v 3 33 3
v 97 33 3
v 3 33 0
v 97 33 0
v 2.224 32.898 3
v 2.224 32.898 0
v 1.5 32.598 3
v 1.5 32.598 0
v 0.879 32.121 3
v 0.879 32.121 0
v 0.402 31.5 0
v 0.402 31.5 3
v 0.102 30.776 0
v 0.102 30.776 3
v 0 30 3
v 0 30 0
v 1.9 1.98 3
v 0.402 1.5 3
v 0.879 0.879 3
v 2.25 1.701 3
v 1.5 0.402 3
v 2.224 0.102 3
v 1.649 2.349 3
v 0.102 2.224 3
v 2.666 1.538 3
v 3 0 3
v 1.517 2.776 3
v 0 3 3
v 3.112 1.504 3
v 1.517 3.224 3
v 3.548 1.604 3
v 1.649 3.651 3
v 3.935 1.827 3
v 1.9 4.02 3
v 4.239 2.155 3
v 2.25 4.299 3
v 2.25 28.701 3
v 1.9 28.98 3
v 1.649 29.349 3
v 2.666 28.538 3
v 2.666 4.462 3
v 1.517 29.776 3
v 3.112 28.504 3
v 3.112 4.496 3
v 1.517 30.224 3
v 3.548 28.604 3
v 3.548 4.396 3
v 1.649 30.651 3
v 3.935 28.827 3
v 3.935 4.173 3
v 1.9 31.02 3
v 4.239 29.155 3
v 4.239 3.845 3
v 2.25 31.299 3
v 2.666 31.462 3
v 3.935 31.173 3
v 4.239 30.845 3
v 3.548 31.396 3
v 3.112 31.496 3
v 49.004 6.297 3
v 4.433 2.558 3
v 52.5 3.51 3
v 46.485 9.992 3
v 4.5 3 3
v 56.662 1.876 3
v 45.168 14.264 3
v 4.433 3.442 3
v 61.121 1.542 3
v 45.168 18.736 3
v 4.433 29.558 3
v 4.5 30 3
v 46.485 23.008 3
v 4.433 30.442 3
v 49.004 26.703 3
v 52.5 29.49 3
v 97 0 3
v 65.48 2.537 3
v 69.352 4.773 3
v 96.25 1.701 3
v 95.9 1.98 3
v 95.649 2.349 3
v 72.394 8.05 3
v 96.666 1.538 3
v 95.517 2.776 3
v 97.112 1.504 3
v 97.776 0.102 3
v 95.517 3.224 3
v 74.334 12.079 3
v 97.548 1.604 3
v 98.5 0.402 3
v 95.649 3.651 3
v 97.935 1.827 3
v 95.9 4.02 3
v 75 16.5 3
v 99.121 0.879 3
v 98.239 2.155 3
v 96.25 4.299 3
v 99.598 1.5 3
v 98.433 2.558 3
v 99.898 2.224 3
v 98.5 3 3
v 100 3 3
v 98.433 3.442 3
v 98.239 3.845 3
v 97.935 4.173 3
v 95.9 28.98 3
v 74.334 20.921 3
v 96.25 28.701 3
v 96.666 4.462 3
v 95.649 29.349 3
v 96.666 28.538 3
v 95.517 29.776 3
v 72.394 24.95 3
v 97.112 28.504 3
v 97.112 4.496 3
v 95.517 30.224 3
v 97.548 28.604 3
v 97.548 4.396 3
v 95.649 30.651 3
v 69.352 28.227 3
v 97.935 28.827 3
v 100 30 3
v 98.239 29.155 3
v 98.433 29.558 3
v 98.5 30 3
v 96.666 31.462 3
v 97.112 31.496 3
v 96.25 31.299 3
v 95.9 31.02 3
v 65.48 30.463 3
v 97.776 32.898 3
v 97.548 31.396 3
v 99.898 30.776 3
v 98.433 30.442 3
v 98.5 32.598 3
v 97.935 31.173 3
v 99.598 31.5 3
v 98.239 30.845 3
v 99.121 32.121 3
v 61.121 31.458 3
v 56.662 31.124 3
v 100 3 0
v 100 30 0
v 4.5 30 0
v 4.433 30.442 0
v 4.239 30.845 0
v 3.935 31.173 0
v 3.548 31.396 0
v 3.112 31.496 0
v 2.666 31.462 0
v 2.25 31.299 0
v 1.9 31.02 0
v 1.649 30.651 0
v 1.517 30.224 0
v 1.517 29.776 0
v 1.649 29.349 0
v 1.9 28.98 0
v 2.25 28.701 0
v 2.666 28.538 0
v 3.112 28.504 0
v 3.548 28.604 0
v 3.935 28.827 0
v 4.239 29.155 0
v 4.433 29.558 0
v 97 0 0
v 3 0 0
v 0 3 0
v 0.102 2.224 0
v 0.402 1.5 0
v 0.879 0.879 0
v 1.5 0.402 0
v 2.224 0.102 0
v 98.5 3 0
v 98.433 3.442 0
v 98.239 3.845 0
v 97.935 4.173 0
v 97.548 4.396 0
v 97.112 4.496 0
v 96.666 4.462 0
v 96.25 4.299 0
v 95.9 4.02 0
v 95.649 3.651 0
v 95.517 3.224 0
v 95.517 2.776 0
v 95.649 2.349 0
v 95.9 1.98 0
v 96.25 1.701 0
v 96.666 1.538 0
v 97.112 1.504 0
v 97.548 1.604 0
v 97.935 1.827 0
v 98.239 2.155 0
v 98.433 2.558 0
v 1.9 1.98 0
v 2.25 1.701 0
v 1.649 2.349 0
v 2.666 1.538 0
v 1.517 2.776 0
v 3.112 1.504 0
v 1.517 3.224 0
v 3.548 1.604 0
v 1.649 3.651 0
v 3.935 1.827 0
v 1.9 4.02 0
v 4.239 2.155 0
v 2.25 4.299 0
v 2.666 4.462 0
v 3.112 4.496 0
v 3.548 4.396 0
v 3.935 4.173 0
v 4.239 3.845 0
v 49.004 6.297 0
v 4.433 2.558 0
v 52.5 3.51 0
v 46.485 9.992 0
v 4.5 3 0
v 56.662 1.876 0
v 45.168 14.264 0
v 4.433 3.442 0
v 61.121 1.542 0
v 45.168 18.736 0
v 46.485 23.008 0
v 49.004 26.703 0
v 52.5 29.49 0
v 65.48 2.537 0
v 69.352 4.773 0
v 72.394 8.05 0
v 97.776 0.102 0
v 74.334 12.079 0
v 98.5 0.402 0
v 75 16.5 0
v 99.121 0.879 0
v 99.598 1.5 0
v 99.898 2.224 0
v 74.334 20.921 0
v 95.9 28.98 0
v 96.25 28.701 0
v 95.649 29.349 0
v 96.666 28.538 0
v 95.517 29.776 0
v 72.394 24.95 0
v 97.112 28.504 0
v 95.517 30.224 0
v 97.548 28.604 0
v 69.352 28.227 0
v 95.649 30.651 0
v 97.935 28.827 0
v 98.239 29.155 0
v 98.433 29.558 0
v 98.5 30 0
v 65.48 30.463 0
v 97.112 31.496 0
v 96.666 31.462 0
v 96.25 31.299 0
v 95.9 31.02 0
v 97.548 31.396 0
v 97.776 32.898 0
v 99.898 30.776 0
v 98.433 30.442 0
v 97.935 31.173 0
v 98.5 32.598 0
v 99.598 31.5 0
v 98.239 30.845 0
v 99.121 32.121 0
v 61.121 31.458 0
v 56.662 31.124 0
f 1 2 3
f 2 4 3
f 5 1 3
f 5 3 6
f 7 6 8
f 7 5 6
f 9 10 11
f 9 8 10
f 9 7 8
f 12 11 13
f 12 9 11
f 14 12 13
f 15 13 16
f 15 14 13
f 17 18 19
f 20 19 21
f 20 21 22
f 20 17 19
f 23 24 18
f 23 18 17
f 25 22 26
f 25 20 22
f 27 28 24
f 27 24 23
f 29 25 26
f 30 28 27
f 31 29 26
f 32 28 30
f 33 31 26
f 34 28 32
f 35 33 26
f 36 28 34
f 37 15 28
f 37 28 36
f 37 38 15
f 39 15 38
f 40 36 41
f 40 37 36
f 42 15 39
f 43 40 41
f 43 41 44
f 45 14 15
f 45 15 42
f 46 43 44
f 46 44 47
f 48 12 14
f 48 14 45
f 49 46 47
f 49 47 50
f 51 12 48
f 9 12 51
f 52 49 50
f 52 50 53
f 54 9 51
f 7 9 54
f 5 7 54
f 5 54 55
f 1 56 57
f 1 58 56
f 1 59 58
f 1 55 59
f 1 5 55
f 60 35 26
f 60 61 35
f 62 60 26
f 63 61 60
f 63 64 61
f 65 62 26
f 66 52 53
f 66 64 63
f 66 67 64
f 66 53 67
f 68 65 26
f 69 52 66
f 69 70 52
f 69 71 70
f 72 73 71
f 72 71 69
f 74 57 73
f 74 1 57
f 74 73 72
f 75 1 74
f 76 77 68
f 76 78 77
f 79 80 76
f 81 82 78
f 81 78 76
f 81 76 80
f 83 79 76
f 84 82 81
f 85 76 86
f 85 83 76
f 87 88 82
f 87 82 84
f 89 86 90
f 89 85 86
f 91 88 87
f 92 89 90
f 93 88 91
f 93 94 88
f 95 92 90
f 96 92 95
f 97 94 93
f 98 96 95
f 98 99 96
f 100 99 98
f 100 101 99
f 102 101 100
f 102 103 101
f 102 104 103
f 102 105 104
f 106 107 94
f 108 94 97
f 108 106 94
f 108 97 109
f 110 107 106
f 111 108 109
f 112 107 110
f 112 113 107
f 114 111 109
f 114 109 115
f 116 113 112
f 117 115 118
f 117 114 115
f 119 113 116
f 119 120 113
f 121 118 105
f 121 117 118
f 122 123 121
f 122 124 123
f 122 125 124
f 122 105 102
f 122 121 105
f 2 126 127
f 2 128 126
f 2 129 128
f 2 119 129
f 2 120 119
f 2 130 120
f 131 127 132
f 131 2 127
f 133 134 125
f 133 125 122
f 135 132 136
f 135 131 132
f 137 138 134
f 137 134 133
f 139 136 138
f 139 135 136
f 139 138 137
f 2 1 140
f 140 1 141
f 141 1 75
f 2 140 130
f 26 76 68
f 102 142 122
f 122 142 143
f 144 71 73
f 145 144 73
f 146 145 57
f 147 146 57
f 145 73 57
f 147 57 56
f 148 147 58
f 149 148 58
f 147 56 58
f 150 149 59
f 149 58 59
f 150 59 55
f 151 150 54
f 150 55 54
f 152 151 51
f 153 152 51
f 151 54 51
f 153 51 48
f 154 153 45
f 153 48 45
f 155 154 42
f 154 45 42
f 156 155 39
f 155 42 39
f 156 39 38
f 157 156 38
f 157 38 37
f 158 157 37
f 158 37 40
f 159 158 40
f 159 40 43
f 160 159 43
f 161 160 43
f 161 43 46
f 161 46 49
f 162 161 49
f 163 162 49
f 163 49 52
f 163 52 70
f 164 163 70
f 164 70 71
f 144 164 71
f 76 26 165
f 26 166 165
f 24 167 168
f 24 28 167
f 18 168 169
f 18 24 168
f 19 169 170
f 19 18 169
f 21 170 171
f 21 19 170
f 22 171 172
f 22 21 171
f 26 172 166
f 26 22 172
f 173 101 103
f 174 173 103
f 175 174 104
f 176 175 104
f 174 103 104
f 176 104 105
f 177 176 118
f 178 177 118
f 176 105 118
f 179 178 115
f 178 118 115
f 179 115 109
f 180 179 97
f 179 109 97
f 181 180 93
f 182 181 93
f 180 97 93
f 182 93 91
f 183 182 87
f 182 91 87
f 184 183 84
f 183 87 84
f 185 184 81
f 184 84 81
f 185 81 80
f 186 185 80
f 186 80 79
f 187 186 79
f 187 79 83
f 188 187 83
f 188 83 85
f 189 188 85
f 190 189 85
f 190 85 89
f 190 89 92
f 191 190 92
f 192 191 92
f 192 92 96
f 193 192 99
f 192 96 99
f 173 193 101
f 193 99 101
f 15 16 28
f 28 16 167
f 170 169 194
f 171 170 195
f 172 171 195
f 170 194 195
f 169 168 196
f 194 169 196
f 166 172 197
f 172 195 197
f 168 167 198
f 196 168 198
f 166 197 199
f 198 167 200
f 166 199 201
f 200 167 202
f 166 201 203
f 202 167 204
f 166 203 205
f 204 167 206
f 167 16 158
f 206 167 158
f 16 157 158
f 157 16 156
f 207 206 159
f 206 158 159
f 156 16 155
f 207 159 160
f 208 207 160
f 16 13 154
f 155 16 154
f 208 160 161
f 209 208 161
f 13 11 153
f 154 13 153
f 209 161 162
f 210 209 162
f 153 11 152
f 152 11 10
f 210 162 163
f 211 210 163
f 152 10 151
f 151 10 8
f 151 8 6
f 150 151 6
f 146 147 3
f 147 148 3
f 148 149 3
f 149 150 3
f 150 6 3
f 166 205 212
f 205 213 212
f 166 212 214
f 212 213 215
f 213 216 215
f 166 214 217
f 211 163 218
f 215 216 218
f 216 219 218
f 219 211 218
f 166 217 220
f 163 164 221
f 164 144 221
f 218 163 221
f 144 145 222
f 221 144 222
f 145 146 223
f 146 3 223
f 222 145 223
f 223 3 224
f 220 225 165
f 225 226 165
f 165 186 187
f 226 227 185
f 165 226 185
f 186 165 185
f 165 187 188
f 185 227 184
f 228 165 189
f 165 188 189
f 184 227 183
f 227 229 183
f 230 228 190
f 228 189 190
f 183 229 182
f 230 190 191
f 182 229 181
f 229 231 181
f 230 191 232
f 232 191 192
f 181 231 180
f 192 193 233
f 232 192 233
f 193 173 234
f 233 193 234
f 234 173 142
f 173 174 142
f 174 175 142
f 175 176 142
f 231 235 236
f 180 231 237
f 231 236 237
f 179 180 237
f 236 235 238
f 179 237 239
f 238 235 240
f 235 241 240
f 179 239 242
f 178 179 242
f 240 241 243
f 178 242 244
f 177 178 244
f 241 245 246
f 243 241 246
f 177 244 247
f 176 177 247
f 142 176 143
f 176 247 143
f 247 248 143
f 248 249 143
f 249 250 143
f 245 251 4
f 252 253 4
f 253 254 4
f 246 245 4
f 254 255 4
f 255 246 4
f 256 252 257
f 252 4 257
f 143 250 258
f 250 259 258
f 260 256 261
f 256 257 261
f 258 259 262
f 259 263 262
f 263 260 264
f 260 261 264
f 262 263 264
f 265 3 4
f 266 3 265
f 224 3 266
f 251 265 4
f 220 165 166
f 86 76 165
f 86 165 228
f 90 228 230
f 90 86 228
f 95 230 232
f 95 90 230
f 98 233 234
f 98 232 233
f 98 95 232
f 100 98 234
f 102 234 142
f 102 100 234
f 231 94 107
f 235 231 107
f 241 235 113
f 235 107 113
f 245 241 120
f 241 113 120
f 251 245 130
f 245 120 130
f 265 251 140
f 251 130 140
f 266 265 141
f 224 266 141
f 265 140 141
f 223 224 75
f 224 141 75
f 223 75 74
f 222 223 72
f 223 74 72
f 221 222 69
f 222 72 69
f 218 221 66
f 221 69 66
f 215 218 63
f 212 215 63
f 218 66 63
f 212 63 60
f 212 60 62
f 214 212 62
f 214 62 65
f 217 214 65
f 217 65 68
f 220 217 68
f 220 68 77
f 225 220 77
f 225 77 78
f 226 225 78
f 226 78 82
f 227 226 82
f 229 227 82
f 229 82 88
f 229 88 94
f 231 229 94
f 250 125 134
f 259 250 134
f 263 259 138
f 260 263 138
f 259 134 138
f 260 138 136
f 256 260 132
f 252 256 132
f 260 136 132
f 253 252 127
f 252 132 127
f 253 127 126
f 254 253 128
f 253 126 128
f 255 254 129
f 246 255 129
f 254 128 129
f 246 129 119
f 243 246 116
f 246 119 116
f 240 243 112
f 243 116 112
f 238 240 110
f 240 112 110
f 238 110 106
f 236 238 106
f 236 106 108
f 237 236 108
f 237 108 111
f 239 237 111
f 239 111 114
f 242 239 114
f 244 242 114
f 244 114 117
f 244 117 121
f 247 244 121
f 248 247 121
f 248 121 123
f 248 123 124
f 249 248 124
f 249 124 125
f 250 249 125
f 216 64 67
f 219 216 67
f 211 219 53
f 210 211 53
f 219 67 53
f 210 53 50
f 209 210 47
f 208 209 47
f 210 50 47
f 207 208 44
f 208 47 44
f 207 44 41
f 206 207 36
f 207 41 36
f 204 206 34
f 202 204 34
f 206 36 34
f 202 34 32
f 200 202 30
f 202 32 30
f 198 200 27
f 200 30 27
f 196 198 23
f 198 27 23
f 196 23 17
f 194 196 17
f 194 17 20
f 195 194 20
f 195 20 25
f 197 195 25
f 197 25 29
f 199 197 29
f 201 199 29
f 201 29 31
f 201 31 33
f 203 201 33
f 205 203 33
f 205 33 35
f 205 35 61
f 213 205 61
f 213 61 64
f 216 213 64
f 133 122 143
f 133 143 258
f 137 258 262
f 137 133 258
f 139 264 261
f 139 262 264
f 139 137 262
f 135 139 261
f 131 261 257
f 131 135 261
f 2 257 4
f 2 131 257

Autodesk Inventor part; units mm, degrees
ref_plane "우측면도" through (0, 0, 0) normal (1, 0, 0) x (0, 1, 0)
ref_plane "평면도" through (0, 0, 0) normal (0, 1, 0) x (-1, 0, 0)
ref_plane "정면도" through (0, 0, 0) normal (0, 0, 1) x (1, 0, 0)
sketch "스케치1" plane through (0, 0, 0) normal (0, 0, 1) x (1, 0, 0)
  line L0 (0, 0) -> (100, 0)
  line L1 (100, 0) -> (100, 33)
  line L2 (100, 33) -> (0, 33)
  line L3 (0, 33) -> (0, 0)
  dimension "d0" = 100
  dimension "d1" = 33
extrude "돌출1" add sketch "스케치1" along normal blind 3
fillet "모깎기1" radius 3 4 edges at (0, 33, 1.5) (0, 0, 1.5) (100, 0, 1.5) (100, 33, 1.5)
sketch "스케치2" plane through (0, 0, 3) normal (0, 0, 1) x (1, 0, 0)
  circle A0 centre (3, 30) radius 1.5
  circle A1 centre (3, 30) radius 3
  line L0 (100, 33) -> (0, 33) projected
  line L1 (0, 33) -> (0, 0) projected
  circle A2 centre (97, 30) radius 1.5
  circle A3 centre (97, 30) radius 3
  circle A4 centre (3, 3) radius 1.5
  circle A5 centre (3, 3) radius 3
  circle A6 centre (97, 3) radius 1.5
  circle A7 centre (97, 3) radius 3
  dimension "d4" = 3
  dimension "d5" = 6
  dimension "d8" = 94
  dimension "d11" = 27
extrude "돌출2" cut sketch "스케치2" against normal blind 4 contours A0 | A2 | A4 | A6
sketch "스케치3" plane through (0, 0, 3) normal (0, 0, 1) x (1, 0, 0)
  line L0 (45, 31.5) -> (75, 31.5) construction
  line L1 (75, 31.5) -> (75, 1.5) construction
  line L2 (75, 1.5) -> (45, 1.5) construction
  line L3 (45, 1.5) -> (45, 31.5) construction
  line L4 (100, 3) -> (100, 30) projected
  line L5 (3, 0) -> (97, 0) projected
  line L6 (97, 33) -> (3, 33) projected
  circle A0 centre (60, 16.5) radius 15
  point P0 (0, 0)
  dimension "d28" = 25
  dimension "d29" = 1.5
  dimension "d30" = 1.5
  dimension "d33" = 30
extrude "돌출3" cut sketch "스케치3" against normal blind 4
equation "\"d8\" = d0 - d5"
equation "\"d11\" = d1 - d5"
equation "\"d30\" = d29"
properties part number "덮개"
